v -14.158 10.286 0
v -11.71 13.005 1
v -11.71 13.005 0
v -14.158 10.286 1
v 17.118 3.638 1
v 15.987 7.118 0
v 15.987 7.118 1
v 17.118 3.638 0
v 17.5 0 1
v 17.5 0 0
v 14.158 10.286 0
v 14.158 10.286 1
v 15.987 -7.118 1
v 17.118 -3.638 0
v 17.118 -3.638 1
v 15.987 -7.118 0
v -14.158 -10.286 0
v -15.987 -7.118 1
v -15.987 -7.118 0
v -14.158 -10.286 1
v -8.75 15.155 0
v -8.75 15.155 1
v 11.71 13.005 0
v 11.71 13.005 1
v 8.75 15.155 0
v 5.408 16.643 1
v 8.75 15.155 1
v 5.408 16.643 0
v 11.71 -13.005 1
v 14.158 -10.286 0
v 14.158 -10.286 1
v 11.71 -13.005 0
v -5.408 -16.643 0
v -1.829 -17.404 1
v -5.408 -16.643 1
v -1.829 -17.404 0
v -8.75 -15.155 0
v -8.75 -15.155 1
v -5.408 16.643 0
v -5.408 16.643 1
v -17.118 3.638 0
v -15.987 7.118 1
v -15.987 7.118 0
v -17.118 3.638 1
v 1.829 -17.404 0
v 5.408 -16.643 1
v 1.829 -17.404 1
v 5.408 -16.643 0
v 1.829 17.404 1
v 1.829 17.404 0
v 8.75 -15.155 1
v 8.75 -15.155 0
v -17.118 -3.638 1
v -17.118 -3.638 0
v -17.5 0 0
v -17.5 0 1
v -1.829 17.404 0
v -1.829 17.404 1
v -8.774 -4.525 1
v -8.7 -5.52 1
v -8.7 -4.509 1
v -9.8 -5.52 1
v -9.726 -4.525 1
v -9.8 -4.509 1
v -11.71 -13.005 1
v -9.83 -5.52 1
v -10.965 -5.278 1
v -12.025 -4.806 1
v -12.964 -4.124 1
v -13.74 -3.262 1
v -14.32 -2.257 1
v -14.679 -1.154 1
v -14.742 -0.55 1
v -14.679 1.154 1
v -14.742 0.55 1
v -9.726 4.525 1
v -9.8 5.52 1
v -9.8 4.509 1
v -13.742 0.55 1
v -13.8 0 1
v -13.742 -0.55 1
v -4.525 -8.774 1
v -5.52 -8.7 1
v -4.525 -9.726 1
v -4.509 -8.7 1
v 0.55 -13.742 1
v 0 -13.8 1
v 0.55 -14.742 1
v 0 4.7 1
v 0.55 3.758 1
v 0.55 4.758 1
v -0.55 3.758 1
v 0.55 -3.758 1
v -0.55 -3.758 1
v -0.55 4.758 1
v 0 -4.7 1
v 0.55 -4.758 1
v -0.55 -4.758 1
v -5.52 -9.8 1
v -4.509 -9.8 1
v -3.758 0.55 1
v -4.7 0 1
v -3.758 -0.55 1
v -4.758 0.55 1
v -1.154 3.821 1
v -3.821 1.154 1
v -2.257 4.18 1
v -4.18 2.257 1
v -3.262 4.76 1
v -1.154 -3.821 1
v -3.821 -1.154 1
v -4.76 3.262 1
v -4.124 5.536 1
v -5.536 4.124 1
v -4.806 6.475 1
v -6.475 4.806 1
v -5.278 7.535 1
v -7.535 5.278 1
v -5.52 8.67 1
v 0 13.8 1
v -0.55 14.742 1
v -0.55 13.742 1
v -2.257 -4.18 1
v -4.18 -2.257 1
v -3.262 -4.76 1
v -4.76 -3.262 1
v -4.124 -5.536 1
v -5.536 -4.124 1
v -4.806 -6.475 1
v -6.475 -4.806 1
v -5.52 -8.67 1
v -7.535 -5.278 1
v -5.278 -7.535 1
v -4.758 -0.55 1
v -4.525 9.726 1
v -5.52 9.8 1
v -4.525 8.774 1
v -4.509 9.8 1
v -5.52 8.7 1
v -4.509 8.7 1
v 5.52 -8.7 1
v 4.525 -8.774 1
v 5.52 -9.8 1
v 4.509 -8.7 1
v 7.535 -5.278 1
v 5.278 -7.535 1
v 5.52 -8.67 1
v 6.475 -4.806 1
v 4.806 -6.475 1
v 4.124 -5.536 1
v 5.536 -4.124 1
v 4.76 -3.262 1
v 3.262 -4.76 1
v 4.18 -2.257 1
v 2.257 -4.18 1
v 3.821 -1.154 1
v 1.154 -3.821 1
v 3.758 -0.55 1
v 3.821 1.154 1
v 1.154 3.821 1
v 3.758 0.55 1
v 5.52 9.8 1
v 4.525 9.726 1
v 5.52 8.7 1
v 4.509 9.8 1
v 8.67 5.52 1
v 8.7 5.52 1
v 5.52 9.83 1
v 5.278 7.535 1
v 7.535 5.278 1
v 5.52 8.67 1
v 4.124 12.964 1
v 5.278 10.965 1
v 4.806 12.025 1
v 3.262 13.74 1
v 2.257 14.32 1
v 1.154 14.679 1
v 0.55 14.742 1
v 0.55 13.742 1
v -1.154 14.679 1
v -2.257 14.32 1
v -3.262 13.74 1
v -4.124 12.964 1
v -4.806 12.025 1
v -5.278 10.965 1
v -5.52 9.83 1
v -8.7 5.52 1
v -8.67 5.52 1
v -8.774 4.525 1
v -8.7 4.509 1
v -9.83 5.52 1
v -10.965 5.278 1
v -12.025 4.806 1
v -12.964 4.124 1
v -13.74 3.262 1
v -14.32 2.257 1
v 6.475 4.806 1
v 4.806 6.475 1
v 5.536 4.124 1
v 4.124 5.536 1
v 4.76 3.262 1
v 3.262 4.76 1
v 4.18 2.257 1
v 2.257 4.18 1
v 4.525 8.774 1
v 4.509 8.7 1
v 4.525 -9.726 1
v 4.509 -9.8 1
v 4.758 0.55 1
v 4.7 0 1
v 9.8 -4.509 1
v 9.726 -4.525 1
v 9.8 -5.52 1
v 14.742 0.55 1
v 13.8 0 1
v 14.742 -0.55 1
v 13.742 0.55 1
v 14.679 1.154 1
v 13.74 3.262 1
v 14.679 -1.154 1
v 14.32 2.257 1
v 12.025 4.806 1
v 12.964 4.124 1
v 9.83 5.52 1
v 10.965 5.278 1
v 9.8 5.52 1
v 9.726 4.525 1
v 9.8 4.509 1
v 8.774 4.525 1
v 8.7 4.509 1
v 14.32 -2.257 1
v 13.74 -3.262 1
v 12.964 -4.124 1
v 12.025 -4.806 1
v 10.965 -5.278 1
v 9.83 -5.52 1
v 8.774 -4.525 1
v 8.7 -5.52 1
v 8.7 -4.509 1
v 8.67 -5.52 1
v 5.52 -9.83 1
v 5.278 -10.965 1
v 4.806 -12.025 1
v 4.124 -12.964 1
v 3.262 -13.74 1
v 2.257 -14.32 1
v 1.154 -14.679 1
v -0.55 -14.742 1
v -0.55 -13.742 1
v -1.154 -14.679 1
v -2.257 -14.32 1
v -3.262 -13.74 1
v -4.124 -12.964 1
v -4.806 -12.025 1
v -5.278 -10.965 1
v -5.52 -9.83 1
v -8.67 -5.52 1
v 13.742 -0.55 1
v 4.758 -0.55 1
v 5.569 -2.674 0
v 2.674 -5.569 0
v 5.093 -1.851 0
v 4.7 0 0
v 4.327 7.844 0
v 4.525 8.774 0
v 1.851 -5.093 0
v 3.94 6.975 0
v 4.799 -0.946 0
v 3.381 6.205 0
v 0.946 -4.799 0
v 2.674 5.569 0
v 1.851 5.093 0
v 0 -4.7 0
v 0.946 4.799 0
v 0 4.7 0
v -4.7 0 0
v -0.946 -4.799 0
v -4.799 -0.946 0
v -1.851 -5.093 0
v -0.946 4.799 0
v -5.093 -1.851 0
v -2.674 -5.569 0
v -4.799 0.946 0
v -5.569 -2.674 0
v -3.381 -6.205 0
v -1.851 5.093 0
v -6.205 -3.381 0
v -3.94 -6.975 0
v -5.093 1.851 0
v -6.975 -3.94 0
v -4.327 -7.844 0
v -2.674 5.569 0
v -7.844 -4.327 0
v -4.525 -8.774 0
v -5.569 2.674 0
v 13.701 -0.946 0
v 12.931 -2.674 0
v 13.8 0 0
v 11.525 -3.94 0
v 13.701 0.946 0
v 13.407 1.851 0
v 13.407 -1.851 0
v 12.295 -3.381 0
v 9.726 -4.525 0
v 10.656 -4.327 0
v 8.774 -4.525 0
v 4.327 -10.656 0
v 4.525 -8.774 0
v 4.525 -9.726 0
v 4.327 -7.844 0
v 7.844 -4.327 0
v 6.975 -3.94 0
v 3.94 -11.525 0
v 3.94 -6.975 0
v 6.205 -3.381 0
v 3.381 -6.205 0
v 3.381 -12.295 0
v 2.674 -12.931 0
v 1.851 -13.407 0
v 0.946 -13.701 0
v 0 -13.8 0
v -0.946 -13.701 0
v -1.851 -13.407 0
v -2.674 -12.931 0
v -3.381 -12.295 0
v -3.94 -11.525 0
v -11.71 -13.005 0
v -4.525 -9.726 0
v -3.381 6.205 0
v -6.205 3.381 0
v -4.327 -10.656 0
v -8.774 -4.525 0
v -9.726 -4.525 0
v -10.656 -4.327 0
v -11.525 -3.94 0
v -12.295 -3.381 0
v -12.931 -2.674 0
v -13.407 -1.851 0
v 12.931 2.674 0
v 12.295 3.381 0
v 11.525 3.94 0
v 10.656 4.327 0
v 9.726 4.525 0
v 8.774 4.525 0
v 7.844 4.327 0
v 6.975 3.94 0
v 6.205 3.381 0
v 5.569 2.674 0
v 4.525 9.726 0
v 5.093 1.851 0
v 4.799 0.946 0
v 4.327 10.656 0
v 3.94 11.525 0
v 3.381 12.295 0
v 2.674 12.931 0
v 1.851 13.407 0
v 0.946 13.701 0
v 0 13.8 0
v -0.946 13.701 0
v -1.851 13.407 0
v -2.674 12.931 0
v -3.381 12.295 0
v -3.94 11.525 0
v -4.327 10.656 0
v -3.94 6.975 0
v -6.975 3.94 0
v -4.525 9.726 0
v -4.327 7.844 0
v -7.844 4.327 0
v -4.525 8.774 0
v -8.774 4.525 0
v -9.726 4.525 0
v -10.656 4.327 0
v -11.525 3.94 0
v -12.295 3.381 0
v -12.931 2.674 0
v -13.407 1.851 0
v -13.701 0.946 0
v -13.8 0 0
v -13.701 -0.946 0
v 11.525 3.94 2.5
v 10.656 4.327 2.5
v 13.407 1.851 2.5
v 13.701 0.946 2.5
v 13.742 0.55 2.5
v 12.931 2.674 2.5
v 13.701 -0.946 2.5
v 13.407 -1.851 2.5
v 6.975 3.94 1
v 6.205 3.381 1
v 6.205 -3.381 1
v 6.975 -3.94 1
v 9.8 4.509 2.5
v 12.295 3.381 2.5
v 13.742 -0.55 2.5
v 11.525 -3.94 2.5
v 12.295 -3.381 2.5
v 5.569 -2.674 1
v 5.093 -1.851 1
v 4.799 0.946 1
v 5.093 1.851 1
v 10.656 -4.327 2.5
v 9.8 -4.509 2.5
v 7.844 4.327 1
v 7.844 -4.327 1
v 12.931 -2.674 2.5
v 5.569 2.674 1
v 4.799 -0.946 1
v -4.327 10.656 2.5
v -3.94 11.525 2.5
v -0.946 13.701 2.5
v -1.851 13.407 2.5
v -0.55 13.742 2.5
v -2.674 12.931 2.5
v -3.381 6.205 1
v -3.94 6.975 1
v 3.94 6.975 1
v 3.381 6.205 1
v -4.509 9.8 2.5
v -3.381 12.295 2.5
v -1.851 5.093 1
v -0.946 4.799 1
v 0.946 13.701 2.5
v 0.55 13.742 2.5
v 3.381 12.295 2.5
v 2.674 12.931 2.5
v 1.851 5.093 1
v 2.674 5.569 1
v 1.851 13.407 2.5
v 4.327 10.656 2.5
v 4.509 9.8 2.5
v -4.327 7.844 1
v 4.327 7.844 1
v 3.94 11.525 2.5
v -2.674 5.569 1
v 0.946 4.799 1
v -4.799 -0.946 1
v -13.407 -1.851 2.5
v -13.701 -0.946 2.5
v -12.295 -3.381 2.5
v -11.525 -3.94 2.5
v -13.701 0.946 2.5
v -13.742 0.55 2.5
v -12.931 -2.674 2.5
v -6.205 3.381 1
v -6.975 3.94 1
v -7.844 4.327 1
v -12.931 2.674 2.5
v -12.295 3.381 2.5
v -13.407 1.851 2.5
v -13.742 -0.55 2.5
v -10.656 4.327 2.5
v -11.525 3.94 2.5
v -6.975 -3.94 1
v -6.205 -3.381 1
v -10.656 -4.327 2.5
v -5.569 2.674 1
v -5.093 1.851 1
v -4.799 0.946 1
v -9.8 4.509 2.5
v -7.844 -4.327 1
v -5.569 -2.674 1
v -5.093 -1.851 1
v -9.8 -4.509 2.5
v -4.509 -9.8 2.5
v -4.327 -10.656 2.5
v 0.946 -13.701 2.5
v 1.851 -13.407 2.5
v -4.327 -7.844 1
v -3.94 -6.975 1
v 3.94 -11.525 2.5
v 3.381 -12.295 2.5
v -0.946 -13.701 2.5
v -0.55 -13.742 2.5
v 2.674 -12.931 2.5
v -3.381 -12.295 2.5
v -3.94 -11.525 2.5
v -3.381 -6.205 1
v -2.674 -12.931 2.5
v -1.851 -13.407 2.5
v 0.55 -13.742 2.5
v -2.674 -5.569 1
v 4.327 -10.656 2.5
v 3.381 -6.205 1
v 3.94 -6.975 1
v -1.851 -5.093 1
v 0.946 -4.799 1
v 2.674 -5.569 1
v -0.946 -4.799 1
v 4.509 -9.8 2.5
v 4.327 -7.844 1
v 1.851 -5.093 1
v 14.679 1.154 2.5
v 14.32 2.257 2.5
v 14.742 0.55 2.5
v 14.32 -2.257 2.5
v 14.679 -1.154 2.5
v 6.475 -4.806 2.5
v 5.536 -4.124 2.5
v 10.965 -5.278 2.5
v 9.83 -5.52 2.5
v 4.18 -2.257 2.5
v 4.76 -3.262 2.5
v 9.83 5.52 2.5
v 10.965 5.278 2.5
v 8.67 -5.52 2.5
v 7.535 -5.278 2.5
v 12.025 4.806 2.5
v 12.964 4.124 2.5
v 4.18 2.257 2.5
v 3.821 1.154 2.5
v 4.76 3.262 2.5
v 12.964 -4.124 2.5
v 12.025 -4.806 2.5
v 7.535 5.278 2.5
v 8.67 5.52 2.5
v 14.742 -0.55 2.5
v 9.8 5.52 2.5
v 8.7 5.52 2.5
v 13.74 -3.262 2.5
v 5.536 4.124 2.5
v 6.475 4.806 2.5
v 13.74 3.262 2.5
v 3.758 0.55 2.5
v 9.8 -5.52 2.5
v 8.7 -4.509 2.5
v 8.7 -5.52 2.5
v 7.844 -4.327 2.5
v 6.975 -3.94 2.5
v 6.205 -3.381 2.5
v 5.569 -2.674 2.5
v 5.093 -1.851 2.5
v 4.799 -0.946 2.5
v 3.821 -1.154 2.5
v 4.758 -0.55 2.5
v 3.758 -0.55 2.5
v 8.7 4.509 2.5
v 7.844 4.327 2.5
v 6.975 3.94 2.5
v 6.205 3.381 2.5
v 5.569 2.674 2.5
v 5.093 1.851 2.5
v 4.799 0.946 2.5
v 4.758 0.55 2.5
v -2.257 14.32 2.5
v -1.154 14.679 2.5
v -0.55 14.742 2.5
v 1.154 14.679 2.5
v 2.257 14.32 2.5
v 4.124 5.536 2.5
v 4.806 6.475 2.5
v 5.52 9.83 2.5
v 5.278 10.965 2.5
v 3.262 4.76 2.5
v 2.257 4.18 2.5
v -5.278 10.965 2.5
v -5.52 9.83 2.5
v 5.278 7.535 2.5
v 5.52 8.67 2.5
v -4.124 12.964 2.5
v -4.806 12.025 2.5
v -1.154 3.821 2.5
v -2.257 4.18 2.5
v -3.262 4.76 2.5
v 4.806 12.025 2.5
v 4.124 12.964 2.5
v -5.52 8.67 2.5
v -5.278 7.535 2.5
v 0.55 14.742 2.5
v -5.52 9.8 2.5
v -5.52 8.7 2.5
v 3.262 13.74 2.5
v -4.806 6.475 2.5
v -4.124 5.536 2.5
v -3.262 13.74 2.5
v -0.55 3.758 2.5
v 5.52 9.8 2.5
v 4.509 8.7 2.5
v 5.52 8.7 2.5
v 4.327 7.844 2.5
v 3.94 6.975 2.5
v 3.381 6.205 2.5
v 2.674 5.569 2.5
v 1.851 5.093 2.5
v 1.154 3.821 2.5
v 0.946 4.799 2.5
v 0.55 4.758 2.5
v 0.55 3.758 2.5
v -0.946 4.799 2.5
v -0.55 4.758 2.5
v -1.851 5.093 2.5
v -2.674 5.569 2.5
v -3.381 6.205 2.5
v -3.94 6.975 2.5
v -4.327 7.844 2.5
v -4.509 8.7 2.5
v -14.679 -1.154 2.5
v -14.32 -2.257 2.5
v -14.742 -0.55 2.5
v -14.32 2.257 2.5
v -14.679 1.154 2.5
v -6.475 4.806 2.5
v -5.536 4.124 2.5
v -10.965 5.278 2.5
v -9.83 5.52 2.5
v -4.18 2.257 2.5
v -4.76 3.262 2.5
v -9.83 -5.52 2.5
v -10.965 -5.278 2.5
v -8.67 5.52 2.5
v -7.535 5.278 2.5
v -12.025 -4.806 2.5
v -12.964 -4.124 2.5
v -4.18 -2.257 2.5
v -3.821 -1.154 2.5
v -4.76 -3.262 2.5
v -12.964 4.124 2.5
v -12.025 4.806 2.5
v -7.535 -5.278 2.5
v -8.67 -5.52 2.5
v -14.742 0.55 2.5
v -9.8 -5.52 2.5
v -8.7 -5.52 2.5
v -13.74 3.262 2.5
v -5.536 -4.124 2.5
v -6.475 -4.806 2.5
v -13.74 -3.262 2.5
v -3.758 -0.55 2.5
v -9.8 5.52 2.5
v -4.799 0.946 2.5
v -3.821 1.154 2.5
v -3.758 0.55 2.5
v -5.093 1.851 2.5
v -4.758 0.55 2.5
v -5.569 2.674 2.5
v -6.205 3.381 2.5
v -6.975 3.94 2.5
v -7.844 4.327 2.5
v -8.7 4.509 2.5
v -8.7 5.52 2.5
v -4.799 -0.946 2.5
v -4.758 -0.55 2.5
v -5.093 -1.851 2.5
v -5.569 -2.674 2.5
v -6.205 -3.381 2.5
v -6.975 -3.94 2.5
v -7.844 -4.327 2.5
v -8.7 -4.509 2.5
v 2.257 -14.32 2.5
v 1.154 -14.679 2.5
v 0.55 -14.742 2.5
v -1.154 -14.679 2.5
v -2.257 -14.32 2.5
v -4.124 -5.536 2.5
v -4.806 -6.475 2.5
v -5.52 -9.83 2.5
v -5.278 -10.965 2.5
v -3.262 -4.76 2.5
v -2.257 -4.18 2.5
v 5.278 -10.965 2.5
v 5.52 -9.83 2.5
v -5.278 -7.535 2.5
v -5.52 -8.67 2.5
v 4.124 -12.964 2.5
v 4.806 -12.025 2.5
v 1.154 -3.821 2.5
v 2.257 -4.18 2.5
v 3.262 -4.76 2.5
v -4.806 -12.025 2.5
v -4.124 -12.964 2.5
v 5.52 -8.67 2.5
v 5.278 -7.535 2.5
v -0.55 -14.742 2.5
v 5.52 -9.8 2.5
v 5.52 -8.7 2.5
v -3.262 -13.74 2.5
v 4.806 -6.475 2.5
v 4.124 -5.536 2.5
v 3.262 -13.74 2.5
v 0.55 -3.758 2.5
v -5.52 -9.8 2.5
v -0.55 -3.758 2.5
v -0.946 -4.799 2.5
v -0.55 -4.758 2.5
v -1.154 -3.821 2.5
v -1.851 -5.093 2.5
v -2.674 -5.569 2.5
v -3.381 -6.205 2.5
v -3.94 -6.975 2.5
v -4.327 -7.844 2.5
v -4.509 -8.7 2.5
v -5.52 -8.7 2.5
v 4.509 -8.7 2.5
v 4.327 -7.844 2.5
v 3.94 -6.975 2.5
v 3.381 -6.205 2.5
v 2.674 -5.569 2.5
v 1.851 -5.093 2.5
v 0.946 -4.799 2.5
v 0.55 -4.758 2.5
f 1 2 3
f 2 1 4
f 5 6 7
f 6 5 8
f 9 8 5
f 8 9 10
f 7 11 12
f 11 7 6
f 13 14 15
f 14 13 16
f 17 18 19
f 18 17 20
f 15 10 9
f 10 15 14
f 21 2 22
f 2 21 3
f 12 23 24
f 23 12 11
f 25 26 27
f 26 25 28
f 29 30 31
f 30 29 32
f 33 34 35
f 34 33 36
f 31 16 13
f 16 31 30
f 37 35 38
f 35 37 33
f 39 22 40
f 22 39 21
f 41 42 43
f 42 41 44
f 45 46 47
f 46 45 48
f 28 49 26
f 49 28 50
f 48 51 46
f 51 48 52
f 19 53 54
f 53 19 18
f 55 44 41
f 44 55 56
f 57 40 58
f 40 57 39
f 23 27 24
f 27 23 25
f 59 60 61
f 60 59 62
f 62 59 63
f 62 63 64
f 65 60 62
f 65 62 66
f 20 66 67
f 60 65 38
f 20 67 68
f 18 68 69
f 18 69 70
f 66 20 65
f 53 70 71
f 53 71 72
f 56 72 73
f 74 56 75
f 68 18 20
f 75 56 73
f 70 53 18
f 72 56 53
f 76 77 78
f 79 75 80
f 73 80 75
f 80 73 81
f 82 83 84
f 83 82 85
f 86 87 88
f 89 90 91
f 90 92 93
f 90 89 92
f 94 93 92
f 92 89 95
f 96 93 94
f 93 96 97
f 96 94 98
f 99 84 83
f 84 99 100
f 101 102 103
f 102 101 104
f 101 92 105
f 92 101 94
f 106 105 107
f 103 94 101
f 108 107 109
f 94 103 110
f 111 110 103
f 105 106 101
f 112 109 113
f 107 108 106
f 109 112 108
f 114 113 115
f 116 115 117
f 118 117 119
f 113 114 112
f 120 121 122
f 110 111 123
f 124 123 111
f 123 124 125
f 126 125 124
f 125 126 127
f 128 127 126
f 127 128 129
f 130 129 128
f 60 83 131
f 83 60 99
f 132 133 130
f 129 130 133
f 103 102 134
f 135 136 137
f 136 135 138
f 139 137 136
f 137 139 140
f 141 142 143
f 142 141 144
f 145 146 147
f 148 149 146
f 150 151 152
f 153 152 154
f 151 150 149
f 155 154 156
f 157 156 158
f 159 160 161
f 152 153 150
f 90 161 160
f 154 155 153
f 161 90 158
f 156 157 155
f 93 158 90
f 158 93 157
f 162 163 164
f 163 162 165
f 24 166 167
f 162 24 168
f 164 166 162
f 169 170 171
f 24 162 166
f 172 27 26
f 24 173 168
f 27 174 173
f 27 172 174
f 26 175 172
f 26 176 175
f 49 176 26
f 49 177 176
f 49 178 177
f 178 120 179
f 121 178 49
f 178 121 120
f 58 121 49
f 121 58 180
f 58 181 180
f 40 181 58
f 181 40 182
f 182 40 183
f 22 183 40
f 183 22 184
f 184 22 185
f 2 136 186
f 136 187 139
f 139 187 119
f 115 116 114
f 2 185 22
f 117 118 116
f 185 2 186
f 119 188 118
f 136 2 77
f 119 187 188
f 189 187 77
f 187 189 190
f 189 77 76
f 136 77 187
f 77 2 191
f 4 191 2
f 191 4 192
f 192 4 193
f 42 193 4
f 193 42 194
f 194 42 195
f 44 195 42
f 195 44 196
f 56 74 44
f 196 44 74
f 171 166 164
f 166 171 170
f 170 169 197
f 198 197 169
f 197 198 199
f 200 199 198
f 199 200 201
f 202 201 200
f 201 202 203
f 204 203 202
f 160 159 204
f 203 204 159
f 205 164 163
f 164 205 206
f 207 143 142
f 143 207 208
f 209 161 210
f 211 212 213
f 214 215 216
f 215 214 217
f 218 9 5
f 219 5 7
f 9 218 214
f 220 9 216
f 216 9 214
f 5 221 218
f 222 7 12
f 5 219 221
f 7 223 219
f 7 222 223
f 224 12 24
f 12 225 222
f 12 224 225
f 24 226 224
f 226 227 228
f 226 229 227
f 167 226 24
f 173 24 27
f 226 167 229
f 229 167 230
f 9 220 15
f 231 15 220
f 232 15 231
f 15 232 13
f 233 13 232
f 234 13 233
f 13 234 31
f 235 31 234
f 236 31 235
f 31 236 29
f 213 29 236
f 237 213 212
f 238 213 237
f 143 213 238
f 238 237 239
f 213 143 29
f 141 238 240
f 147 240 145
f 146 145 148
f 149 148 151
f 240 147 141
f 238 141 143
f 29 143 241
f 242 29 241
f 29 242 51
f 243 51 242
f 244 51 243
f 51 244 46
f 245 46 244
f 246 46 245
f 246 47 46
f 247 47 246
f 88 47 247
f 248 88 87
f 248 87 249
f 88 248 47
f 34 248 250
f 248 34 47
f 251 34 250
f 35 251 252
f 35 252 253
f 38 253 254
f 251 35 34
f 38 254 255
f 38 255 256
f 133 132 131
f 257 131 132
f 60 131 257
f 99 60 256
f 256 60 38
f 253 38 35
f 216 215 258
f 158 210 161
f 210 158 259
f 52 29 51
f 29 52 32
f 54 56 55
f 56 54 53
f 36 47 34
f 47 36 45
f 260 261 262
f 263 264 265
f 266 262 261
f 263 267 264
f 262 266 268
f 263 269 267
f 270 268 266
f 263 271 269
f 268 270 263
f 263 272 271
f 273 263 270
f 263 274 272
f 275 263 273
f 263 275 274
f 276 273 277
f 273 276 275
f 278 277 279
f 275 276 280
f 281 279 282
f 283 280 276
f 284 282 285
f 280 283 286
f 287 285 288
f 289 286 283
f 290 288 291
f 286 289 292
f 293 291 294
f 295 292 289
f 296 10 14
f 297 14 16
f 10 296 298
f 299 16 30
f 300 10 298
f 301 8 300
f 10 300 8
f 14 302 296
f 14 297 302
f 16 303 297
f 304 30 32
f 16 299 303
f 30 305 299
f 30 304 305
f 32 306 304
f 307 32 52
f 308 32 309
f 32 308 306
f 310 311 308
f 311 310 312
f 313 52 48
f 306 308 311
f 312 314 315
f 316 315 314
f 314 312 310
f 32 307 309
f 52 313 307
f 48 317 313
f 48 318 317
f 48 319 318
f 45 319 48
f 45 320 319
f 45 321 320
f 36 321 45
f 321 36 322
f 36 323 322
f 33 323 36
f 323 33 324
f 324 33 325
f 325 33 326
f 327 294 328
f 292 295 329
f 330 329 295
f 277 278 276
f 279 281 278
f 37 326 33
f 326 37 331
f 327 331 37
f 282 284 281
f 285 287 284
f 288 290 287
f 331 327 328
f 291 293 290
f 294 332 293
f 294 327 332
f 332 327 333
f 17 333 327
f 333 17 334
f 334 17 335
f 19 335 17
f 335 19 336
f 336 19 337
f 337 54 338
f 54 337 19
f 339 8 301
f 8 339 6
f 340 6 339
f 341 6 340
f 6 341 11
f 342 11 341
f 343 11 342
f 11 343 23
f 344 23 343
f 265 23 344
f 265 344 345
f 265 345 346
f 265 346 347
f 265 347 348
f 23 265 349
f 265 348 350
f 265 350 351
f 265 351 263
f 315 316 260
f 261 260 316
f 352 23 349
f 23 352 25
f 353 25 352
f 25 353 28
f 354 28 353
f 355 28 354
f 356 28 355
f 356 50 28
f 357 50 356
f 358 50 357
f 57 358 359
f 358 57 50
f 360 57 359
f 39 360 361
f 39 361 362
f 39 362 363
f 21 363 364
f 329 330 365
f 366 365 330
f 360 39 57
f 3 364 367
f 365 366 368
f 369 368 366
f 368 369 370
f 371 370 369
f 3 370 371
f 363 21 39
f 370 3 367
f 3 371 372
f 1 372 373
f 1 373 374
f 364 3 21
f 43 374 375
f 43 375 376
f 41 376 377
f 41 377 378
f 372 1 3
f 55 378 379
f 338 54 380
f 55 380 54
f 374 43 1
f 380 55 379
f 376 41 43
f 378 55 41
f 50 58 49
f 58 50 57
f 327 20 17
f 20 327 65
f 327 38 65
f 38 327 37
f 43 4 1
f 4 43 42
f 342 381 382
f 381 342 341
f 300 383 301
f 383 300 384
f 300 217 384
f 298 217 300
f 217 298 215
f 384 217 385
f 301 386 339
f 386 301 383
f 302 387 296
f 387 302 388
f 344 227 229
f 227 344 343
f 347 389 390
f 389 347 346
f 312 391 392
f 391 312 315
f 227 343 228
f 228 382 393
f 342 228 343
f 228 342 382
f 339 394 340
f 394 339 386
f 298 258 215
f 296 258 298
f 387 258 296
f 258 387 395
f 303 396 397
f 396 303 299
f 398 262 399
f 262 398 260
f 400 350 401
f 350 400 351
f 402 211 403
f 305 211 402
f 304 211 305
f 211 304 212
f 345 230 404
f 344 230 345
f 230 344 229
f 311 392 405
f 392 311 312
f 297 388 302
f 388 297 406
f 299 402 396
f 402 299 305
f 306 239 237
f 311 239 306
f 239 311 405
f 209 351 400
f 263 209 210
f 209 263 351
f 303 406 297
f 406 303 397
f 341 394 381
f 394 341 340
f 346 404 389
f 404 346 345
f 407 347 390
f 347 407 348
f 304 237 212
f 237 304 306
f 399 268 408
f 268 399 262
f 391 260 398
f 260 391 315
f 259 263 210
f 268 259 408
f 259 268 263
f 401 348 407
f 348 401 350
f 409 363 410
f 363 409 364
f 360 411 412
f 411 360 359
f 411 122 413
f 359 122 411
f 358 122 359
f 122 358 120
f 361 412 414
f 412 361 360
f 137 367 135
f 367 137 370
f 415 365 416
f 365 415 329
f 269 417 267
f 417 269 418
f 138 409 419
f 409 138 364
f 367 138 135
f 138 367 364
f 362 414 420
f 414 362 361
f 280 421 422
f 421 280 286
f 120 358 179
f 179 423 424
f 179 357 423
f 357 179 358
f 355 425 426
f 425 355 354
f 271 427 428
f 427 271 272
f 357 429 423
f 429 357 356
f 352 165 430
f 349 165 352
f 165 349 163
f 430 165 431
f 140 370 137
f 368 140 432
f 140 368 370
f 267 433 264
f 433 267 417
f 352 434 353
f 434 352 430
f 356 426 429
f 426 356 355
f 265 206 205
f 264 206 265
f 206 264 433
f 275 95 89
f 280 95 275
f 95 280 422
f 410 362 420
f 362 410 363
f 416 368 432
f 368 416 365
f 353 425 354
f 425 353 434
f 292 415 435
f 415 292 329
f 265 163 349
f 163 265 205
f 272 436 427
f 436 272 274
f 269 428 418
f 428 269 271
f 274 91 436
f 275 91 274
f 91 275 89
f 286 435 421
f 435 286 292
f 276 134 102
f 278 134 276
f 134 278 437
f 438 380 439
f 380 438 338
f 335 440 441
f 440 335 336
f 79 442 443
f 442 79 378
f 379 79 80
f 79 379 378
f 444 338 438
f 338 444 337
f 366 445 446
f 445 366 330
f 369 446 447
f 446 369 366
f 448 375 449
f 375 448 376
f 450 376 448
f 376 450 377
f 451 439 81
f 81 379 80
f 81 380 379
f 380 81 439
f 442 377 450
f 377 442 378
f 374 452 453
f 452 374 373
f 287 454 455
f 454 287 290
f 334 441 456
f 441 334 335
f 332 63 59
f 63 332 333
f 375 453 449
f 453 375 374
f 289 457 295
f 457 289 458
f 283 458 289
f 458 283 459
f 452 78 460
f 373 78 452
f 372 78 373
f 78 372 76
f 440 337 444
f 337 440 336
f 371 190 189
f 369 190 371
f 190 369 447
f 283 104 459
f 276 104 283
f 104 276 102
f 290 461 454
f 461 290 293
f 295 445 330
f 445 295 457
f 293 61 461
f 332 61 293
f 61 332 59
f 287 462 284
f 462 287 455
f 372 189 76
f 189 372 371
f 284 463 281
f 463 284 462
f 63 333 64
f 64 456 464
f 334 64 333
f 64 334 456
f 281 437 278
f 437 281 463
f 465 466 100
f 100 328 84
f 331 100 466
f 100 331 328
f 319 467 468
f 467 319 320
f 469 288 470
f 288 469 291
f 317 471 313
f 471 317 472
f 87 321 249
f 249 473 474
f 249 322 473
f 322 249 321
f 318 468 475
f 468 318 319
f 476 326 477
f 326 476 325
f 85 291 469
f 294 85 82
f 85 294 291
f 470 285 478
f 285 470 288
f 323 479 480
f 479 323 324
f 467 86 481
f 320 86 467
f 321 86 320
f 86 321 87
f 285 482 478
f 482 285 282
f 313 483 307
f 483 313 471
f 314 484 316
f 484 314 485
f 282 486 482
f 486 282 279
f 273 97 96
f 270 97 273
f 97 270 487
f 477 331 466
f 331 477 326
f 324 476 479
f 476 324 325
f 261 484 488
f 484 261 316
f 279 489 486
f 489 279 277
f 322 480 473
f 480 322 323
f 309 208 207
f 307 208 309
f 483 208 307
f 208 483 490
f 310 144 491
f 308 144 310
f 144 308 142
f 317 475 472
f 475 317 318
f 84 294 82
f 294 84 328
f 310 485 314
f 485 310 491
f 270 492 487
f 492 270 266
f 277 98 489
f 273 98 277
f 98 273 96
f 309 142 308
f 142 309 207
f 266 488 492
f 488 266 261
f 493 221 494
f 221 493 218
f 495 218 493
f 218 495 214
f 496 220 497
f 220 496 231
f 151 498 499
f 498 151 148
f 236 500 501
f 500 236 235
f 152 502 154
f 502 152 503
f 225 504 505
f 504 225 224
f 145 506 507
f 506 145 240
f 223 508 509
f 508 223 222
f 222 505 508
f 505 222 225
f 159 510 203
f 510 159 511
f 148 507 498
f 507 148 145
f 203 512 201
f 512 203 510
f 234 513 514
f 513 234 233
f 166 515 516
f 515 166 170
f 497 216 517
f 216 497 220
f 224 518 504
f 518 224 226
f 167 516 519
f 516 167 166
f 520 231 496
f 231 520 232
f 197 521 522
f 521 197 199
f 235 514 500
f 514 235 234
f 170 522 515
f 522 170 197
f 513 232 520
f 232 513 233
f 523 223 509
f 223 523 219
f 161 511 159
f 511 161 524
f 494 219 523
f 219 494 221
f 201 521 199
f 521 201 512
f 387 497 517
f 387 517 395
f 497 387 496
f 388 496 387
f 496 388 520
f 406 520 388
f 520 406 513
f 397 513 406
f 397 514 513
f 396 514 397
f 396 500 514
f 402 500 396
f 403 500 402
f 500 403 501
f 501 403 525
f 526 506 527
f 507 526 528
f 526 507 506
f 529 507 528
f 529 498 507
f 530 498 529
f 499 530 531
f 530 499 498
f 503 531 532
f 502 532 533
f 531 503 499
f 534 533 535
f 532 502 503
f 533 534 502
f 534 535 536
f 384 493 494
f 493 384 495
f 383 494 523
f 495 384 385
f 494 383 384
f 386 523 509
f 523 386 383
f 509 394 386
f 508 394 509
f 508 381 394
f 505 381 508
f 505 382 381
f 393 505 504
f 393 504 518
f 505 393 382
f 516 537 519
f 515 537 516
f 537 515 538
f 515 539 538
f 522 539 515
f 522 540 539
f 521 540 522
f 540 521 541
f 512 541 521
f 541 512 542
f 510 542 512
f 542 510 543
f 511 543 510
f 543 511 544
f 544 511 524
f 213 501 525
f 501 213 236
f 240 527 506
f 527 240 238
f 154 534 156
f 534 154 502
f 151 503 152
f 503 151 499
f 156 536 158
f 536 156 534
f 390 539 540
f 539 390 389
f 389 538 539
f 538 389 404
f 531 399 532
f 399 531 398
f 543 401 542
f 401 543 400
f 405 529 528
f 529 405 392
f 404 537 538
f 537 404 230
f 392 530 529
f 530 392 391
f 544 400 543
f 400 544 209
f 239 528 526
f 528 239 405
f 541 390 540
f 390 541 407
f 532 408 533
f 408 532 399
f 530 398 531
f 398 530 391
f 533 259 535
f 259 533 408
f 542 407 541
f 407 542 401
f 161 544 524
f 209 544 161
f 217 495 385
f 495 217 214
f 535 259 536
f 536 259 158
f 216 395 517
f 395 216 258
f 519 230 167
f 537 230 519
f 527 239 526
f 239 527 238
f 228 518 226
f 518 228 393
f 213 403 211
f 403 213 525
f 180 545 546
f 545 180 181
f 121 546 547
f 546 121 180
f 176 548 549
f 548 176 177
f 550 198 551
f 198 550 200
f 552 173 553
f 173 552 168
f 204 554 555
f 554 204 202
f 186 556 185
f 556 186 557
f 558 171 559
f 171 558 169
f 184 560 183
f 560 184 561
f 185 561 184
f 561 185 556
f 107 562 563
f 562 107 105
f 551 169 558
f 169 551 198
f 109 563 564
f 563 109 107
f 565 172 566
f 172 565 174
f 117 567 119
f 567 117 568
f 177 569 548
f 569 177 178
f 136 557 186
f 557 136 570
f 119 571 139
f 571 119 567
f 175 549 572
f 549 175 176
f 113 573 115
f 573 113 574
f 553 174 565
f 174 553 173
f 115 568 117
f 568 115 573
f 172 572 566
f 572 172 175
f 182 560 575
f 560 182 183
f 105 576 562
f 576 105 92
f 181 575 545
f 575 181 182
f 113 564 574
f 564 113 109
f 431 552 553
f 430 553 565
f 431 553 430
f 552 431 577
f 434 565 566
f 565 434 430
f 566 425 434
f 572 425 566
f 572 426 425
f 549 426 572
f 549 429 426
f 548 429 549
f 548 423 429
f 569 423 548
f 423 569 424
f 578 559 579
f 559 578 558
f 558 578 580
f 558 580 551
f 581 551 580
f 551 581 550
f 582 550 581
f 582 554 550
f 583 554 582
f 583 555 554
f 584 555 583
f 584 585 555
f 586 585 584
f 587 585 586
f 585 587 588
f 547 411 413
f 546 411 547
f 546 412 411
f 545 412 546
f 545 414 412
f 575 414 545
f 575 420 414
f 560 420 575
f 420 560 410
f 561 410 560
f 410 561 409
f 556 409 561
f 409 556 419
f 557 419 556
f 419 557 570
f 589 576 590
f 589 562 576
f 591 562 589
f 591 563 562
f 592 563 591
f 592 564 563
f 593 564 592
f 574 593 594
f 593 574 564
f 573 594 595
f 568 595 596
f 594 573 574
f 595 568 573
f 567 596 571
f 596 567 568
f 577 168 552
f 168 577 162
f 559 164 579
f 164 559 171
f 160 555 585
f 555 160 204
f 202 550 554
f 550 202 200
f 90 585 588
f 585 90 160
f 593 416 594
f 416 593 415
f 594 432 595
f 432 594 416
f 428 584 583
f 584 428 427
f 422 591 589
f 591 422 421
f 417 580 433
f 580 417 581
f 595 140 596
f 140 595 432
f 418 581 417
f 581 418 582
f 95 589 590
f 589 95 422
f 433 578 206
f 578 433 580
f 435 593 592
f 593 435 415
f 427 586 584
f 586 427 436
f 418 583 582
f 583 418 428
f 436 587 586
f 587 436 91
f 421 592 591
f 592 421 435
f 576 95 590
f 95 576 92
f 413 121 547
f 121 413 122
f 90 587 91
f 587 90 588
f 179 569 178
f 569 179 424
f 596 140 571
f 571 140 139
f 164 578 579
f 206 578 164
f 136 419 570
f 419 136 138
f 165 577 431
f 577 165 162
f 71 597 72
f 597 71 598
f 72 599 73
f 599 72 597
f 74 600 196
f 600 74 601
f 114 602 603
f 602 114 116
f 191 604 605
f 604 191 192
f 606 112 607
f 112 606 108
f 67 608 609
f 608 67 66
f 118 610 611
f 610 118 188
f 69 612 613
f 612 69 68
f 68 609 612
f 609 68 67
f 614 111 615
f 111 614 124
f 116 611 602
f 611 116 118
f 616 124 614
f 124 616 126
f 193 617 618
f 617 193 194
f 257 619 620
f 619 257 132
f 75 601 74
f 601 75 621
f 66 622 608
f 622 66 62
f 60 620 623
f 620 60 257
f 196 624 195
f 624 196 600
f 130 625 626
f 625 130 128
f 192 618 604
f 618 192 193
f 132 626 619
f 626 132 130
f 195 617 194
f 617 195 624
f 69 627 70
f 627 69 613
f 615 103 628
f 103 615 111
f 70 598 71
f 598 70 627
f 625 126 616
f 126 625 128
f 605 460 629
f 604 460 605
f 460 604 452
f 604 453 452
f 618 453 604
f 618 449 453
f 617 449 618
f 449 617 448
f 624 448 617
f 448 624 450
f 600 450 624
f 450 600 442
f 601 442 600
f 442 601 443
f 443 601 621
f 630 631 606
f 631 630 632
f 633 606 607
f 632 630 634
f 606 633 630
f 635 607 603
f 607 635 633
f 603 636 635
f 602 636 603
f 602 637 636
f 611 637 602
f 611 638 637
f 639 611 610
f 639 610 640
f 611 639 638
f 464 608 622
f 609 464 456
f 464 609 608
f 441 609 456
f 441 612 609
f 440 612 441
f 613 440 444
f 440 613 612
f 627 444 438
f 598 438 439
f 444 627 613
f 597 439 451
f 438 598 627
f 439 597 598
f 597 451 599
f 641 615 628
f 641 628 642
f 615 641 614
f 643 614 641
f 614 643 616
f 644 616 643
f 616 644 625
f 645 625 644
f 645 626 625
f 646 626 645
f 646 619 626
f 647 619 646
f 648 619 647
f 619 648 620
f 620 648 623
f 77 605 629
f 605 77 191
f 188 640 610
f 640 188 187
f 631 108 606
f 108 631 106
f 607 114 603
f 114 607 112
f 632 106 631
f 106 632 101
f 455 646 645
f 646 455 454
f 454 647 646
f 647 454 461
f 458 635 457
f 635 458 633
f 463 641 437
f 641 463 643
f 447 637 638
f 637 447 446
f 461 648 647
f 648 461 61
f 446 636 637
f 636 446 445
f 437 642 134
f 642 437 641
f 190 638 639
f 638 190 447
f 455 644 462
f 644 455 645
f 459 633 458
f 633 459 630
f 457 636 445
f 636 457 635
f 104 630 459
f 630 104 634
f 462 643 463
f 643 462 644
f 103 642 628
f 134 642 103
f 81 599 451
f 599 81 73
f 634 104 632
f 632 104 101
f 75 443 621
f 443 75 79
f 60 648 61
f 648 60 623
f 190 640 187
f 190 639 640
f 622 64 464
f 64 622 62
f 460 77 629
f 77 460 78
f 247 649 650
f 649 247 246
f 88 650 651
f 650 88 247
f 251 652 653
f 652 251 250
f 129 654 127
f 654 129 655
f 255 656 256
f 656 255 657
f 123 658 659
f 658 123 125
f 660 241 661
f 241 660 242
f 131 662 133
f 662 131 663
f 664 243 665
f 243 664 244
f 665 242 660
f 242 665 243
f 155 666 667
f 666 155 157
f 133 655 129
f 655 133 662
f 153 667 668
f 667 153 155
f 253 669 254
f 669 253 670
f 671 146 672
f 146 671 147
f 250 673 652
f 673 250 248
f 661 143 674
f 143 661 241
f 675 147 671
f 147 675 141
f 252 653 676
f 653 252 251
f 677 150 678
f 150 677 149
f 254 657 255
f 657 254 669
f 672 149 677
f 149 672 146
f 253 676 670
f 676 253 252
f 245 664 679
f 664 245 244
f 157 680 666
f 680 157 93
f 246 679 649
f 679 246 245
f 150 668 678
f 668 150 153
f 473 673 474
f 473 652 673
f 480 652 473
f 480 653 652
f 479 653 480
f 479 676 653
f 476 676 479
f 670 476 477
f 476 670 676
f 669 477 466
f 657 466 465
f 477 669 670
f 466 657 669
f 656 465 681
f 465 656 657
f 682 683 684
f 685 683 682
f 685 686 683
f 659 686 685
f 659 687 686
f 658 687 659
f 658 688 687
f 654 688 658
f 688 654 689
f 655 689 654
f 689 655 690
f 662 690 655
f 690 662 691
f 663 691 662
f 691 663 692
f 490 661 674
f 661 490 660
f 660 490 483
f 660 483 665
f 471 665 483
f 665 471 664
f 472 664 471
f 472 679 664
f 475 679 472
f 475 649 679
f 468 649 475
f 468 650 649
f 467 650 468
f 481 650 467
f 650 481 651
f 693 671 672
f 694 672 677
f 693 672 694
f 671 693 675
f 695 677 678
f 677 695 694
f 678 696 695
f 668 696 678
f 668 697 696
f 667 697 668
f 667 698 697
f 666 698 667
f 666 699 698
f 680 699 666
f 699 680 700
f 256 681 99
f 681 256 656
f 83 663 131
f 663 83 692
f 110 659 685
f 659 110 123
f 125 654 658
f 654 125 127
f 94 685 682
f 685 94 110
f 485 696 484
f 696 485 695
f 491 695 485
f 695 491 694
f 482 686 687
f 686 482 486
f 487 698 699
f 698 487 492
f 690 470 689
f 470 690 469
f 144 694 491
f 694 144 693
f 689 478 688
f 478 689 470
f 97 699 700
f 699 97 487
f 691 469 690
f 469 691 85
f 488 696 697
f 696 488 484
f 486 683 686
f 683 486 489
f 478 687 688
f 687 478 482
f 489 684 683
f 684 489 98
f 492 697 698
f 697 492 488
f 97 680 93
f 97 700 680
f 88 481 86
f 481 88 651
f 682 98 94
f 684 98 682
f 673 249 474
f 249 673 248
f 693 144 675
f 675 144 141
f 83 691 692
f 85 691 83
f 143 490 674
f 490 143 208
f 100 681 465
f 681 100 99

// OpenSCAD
$fs = .4;

R = 35 / 2; // Holder radius (equal to touchpad radius).
BR = 9.1 / 2; // Button hole radius.
T = 1; // Thickness.
M = 3.7; // Margin between holder boundary and button hole.
TTUBE = 1; // Thickness of the tube wall.
HTUBE = 1.5; // Height of the tube.
WRAIL = 1.1; // Width of the rail cutout.

module button_hole() {
  translate([R - M - BR, 0, -.1])
    cylinder(h=T + .2, r=BR);
}

module rail() {
  translate([-BR - TTUBE - .1, -WRAIL / 2, -.1])
    cube([(BR + TTUBE + .1) * 2, WRAIL, HTUBE + .2]);
}

module tube() {
  translate([R - M - BR, 0, T])
    difference() {
      cylinder(h=HTUBE, r=BR + TTUBE);
      translate([0, 0, -.1])
        cylinder(h=HTUBE + .2, r=BR);
      rail();
      rotate(90) rail();
    }
}

module button_holder() {
  color("#1a1c2c") union() {
      difference() {
        cylinder(h=T, r=R);
        button_hole();
        rotate(90) button_hole();
        rotate(180) button_hole();
        rotate(270) button_hole();
      }
      tube();
      rotate(90) tube();
      rotate(180) tube();
      rotate(270) tube();
    }
}

button_holder();
